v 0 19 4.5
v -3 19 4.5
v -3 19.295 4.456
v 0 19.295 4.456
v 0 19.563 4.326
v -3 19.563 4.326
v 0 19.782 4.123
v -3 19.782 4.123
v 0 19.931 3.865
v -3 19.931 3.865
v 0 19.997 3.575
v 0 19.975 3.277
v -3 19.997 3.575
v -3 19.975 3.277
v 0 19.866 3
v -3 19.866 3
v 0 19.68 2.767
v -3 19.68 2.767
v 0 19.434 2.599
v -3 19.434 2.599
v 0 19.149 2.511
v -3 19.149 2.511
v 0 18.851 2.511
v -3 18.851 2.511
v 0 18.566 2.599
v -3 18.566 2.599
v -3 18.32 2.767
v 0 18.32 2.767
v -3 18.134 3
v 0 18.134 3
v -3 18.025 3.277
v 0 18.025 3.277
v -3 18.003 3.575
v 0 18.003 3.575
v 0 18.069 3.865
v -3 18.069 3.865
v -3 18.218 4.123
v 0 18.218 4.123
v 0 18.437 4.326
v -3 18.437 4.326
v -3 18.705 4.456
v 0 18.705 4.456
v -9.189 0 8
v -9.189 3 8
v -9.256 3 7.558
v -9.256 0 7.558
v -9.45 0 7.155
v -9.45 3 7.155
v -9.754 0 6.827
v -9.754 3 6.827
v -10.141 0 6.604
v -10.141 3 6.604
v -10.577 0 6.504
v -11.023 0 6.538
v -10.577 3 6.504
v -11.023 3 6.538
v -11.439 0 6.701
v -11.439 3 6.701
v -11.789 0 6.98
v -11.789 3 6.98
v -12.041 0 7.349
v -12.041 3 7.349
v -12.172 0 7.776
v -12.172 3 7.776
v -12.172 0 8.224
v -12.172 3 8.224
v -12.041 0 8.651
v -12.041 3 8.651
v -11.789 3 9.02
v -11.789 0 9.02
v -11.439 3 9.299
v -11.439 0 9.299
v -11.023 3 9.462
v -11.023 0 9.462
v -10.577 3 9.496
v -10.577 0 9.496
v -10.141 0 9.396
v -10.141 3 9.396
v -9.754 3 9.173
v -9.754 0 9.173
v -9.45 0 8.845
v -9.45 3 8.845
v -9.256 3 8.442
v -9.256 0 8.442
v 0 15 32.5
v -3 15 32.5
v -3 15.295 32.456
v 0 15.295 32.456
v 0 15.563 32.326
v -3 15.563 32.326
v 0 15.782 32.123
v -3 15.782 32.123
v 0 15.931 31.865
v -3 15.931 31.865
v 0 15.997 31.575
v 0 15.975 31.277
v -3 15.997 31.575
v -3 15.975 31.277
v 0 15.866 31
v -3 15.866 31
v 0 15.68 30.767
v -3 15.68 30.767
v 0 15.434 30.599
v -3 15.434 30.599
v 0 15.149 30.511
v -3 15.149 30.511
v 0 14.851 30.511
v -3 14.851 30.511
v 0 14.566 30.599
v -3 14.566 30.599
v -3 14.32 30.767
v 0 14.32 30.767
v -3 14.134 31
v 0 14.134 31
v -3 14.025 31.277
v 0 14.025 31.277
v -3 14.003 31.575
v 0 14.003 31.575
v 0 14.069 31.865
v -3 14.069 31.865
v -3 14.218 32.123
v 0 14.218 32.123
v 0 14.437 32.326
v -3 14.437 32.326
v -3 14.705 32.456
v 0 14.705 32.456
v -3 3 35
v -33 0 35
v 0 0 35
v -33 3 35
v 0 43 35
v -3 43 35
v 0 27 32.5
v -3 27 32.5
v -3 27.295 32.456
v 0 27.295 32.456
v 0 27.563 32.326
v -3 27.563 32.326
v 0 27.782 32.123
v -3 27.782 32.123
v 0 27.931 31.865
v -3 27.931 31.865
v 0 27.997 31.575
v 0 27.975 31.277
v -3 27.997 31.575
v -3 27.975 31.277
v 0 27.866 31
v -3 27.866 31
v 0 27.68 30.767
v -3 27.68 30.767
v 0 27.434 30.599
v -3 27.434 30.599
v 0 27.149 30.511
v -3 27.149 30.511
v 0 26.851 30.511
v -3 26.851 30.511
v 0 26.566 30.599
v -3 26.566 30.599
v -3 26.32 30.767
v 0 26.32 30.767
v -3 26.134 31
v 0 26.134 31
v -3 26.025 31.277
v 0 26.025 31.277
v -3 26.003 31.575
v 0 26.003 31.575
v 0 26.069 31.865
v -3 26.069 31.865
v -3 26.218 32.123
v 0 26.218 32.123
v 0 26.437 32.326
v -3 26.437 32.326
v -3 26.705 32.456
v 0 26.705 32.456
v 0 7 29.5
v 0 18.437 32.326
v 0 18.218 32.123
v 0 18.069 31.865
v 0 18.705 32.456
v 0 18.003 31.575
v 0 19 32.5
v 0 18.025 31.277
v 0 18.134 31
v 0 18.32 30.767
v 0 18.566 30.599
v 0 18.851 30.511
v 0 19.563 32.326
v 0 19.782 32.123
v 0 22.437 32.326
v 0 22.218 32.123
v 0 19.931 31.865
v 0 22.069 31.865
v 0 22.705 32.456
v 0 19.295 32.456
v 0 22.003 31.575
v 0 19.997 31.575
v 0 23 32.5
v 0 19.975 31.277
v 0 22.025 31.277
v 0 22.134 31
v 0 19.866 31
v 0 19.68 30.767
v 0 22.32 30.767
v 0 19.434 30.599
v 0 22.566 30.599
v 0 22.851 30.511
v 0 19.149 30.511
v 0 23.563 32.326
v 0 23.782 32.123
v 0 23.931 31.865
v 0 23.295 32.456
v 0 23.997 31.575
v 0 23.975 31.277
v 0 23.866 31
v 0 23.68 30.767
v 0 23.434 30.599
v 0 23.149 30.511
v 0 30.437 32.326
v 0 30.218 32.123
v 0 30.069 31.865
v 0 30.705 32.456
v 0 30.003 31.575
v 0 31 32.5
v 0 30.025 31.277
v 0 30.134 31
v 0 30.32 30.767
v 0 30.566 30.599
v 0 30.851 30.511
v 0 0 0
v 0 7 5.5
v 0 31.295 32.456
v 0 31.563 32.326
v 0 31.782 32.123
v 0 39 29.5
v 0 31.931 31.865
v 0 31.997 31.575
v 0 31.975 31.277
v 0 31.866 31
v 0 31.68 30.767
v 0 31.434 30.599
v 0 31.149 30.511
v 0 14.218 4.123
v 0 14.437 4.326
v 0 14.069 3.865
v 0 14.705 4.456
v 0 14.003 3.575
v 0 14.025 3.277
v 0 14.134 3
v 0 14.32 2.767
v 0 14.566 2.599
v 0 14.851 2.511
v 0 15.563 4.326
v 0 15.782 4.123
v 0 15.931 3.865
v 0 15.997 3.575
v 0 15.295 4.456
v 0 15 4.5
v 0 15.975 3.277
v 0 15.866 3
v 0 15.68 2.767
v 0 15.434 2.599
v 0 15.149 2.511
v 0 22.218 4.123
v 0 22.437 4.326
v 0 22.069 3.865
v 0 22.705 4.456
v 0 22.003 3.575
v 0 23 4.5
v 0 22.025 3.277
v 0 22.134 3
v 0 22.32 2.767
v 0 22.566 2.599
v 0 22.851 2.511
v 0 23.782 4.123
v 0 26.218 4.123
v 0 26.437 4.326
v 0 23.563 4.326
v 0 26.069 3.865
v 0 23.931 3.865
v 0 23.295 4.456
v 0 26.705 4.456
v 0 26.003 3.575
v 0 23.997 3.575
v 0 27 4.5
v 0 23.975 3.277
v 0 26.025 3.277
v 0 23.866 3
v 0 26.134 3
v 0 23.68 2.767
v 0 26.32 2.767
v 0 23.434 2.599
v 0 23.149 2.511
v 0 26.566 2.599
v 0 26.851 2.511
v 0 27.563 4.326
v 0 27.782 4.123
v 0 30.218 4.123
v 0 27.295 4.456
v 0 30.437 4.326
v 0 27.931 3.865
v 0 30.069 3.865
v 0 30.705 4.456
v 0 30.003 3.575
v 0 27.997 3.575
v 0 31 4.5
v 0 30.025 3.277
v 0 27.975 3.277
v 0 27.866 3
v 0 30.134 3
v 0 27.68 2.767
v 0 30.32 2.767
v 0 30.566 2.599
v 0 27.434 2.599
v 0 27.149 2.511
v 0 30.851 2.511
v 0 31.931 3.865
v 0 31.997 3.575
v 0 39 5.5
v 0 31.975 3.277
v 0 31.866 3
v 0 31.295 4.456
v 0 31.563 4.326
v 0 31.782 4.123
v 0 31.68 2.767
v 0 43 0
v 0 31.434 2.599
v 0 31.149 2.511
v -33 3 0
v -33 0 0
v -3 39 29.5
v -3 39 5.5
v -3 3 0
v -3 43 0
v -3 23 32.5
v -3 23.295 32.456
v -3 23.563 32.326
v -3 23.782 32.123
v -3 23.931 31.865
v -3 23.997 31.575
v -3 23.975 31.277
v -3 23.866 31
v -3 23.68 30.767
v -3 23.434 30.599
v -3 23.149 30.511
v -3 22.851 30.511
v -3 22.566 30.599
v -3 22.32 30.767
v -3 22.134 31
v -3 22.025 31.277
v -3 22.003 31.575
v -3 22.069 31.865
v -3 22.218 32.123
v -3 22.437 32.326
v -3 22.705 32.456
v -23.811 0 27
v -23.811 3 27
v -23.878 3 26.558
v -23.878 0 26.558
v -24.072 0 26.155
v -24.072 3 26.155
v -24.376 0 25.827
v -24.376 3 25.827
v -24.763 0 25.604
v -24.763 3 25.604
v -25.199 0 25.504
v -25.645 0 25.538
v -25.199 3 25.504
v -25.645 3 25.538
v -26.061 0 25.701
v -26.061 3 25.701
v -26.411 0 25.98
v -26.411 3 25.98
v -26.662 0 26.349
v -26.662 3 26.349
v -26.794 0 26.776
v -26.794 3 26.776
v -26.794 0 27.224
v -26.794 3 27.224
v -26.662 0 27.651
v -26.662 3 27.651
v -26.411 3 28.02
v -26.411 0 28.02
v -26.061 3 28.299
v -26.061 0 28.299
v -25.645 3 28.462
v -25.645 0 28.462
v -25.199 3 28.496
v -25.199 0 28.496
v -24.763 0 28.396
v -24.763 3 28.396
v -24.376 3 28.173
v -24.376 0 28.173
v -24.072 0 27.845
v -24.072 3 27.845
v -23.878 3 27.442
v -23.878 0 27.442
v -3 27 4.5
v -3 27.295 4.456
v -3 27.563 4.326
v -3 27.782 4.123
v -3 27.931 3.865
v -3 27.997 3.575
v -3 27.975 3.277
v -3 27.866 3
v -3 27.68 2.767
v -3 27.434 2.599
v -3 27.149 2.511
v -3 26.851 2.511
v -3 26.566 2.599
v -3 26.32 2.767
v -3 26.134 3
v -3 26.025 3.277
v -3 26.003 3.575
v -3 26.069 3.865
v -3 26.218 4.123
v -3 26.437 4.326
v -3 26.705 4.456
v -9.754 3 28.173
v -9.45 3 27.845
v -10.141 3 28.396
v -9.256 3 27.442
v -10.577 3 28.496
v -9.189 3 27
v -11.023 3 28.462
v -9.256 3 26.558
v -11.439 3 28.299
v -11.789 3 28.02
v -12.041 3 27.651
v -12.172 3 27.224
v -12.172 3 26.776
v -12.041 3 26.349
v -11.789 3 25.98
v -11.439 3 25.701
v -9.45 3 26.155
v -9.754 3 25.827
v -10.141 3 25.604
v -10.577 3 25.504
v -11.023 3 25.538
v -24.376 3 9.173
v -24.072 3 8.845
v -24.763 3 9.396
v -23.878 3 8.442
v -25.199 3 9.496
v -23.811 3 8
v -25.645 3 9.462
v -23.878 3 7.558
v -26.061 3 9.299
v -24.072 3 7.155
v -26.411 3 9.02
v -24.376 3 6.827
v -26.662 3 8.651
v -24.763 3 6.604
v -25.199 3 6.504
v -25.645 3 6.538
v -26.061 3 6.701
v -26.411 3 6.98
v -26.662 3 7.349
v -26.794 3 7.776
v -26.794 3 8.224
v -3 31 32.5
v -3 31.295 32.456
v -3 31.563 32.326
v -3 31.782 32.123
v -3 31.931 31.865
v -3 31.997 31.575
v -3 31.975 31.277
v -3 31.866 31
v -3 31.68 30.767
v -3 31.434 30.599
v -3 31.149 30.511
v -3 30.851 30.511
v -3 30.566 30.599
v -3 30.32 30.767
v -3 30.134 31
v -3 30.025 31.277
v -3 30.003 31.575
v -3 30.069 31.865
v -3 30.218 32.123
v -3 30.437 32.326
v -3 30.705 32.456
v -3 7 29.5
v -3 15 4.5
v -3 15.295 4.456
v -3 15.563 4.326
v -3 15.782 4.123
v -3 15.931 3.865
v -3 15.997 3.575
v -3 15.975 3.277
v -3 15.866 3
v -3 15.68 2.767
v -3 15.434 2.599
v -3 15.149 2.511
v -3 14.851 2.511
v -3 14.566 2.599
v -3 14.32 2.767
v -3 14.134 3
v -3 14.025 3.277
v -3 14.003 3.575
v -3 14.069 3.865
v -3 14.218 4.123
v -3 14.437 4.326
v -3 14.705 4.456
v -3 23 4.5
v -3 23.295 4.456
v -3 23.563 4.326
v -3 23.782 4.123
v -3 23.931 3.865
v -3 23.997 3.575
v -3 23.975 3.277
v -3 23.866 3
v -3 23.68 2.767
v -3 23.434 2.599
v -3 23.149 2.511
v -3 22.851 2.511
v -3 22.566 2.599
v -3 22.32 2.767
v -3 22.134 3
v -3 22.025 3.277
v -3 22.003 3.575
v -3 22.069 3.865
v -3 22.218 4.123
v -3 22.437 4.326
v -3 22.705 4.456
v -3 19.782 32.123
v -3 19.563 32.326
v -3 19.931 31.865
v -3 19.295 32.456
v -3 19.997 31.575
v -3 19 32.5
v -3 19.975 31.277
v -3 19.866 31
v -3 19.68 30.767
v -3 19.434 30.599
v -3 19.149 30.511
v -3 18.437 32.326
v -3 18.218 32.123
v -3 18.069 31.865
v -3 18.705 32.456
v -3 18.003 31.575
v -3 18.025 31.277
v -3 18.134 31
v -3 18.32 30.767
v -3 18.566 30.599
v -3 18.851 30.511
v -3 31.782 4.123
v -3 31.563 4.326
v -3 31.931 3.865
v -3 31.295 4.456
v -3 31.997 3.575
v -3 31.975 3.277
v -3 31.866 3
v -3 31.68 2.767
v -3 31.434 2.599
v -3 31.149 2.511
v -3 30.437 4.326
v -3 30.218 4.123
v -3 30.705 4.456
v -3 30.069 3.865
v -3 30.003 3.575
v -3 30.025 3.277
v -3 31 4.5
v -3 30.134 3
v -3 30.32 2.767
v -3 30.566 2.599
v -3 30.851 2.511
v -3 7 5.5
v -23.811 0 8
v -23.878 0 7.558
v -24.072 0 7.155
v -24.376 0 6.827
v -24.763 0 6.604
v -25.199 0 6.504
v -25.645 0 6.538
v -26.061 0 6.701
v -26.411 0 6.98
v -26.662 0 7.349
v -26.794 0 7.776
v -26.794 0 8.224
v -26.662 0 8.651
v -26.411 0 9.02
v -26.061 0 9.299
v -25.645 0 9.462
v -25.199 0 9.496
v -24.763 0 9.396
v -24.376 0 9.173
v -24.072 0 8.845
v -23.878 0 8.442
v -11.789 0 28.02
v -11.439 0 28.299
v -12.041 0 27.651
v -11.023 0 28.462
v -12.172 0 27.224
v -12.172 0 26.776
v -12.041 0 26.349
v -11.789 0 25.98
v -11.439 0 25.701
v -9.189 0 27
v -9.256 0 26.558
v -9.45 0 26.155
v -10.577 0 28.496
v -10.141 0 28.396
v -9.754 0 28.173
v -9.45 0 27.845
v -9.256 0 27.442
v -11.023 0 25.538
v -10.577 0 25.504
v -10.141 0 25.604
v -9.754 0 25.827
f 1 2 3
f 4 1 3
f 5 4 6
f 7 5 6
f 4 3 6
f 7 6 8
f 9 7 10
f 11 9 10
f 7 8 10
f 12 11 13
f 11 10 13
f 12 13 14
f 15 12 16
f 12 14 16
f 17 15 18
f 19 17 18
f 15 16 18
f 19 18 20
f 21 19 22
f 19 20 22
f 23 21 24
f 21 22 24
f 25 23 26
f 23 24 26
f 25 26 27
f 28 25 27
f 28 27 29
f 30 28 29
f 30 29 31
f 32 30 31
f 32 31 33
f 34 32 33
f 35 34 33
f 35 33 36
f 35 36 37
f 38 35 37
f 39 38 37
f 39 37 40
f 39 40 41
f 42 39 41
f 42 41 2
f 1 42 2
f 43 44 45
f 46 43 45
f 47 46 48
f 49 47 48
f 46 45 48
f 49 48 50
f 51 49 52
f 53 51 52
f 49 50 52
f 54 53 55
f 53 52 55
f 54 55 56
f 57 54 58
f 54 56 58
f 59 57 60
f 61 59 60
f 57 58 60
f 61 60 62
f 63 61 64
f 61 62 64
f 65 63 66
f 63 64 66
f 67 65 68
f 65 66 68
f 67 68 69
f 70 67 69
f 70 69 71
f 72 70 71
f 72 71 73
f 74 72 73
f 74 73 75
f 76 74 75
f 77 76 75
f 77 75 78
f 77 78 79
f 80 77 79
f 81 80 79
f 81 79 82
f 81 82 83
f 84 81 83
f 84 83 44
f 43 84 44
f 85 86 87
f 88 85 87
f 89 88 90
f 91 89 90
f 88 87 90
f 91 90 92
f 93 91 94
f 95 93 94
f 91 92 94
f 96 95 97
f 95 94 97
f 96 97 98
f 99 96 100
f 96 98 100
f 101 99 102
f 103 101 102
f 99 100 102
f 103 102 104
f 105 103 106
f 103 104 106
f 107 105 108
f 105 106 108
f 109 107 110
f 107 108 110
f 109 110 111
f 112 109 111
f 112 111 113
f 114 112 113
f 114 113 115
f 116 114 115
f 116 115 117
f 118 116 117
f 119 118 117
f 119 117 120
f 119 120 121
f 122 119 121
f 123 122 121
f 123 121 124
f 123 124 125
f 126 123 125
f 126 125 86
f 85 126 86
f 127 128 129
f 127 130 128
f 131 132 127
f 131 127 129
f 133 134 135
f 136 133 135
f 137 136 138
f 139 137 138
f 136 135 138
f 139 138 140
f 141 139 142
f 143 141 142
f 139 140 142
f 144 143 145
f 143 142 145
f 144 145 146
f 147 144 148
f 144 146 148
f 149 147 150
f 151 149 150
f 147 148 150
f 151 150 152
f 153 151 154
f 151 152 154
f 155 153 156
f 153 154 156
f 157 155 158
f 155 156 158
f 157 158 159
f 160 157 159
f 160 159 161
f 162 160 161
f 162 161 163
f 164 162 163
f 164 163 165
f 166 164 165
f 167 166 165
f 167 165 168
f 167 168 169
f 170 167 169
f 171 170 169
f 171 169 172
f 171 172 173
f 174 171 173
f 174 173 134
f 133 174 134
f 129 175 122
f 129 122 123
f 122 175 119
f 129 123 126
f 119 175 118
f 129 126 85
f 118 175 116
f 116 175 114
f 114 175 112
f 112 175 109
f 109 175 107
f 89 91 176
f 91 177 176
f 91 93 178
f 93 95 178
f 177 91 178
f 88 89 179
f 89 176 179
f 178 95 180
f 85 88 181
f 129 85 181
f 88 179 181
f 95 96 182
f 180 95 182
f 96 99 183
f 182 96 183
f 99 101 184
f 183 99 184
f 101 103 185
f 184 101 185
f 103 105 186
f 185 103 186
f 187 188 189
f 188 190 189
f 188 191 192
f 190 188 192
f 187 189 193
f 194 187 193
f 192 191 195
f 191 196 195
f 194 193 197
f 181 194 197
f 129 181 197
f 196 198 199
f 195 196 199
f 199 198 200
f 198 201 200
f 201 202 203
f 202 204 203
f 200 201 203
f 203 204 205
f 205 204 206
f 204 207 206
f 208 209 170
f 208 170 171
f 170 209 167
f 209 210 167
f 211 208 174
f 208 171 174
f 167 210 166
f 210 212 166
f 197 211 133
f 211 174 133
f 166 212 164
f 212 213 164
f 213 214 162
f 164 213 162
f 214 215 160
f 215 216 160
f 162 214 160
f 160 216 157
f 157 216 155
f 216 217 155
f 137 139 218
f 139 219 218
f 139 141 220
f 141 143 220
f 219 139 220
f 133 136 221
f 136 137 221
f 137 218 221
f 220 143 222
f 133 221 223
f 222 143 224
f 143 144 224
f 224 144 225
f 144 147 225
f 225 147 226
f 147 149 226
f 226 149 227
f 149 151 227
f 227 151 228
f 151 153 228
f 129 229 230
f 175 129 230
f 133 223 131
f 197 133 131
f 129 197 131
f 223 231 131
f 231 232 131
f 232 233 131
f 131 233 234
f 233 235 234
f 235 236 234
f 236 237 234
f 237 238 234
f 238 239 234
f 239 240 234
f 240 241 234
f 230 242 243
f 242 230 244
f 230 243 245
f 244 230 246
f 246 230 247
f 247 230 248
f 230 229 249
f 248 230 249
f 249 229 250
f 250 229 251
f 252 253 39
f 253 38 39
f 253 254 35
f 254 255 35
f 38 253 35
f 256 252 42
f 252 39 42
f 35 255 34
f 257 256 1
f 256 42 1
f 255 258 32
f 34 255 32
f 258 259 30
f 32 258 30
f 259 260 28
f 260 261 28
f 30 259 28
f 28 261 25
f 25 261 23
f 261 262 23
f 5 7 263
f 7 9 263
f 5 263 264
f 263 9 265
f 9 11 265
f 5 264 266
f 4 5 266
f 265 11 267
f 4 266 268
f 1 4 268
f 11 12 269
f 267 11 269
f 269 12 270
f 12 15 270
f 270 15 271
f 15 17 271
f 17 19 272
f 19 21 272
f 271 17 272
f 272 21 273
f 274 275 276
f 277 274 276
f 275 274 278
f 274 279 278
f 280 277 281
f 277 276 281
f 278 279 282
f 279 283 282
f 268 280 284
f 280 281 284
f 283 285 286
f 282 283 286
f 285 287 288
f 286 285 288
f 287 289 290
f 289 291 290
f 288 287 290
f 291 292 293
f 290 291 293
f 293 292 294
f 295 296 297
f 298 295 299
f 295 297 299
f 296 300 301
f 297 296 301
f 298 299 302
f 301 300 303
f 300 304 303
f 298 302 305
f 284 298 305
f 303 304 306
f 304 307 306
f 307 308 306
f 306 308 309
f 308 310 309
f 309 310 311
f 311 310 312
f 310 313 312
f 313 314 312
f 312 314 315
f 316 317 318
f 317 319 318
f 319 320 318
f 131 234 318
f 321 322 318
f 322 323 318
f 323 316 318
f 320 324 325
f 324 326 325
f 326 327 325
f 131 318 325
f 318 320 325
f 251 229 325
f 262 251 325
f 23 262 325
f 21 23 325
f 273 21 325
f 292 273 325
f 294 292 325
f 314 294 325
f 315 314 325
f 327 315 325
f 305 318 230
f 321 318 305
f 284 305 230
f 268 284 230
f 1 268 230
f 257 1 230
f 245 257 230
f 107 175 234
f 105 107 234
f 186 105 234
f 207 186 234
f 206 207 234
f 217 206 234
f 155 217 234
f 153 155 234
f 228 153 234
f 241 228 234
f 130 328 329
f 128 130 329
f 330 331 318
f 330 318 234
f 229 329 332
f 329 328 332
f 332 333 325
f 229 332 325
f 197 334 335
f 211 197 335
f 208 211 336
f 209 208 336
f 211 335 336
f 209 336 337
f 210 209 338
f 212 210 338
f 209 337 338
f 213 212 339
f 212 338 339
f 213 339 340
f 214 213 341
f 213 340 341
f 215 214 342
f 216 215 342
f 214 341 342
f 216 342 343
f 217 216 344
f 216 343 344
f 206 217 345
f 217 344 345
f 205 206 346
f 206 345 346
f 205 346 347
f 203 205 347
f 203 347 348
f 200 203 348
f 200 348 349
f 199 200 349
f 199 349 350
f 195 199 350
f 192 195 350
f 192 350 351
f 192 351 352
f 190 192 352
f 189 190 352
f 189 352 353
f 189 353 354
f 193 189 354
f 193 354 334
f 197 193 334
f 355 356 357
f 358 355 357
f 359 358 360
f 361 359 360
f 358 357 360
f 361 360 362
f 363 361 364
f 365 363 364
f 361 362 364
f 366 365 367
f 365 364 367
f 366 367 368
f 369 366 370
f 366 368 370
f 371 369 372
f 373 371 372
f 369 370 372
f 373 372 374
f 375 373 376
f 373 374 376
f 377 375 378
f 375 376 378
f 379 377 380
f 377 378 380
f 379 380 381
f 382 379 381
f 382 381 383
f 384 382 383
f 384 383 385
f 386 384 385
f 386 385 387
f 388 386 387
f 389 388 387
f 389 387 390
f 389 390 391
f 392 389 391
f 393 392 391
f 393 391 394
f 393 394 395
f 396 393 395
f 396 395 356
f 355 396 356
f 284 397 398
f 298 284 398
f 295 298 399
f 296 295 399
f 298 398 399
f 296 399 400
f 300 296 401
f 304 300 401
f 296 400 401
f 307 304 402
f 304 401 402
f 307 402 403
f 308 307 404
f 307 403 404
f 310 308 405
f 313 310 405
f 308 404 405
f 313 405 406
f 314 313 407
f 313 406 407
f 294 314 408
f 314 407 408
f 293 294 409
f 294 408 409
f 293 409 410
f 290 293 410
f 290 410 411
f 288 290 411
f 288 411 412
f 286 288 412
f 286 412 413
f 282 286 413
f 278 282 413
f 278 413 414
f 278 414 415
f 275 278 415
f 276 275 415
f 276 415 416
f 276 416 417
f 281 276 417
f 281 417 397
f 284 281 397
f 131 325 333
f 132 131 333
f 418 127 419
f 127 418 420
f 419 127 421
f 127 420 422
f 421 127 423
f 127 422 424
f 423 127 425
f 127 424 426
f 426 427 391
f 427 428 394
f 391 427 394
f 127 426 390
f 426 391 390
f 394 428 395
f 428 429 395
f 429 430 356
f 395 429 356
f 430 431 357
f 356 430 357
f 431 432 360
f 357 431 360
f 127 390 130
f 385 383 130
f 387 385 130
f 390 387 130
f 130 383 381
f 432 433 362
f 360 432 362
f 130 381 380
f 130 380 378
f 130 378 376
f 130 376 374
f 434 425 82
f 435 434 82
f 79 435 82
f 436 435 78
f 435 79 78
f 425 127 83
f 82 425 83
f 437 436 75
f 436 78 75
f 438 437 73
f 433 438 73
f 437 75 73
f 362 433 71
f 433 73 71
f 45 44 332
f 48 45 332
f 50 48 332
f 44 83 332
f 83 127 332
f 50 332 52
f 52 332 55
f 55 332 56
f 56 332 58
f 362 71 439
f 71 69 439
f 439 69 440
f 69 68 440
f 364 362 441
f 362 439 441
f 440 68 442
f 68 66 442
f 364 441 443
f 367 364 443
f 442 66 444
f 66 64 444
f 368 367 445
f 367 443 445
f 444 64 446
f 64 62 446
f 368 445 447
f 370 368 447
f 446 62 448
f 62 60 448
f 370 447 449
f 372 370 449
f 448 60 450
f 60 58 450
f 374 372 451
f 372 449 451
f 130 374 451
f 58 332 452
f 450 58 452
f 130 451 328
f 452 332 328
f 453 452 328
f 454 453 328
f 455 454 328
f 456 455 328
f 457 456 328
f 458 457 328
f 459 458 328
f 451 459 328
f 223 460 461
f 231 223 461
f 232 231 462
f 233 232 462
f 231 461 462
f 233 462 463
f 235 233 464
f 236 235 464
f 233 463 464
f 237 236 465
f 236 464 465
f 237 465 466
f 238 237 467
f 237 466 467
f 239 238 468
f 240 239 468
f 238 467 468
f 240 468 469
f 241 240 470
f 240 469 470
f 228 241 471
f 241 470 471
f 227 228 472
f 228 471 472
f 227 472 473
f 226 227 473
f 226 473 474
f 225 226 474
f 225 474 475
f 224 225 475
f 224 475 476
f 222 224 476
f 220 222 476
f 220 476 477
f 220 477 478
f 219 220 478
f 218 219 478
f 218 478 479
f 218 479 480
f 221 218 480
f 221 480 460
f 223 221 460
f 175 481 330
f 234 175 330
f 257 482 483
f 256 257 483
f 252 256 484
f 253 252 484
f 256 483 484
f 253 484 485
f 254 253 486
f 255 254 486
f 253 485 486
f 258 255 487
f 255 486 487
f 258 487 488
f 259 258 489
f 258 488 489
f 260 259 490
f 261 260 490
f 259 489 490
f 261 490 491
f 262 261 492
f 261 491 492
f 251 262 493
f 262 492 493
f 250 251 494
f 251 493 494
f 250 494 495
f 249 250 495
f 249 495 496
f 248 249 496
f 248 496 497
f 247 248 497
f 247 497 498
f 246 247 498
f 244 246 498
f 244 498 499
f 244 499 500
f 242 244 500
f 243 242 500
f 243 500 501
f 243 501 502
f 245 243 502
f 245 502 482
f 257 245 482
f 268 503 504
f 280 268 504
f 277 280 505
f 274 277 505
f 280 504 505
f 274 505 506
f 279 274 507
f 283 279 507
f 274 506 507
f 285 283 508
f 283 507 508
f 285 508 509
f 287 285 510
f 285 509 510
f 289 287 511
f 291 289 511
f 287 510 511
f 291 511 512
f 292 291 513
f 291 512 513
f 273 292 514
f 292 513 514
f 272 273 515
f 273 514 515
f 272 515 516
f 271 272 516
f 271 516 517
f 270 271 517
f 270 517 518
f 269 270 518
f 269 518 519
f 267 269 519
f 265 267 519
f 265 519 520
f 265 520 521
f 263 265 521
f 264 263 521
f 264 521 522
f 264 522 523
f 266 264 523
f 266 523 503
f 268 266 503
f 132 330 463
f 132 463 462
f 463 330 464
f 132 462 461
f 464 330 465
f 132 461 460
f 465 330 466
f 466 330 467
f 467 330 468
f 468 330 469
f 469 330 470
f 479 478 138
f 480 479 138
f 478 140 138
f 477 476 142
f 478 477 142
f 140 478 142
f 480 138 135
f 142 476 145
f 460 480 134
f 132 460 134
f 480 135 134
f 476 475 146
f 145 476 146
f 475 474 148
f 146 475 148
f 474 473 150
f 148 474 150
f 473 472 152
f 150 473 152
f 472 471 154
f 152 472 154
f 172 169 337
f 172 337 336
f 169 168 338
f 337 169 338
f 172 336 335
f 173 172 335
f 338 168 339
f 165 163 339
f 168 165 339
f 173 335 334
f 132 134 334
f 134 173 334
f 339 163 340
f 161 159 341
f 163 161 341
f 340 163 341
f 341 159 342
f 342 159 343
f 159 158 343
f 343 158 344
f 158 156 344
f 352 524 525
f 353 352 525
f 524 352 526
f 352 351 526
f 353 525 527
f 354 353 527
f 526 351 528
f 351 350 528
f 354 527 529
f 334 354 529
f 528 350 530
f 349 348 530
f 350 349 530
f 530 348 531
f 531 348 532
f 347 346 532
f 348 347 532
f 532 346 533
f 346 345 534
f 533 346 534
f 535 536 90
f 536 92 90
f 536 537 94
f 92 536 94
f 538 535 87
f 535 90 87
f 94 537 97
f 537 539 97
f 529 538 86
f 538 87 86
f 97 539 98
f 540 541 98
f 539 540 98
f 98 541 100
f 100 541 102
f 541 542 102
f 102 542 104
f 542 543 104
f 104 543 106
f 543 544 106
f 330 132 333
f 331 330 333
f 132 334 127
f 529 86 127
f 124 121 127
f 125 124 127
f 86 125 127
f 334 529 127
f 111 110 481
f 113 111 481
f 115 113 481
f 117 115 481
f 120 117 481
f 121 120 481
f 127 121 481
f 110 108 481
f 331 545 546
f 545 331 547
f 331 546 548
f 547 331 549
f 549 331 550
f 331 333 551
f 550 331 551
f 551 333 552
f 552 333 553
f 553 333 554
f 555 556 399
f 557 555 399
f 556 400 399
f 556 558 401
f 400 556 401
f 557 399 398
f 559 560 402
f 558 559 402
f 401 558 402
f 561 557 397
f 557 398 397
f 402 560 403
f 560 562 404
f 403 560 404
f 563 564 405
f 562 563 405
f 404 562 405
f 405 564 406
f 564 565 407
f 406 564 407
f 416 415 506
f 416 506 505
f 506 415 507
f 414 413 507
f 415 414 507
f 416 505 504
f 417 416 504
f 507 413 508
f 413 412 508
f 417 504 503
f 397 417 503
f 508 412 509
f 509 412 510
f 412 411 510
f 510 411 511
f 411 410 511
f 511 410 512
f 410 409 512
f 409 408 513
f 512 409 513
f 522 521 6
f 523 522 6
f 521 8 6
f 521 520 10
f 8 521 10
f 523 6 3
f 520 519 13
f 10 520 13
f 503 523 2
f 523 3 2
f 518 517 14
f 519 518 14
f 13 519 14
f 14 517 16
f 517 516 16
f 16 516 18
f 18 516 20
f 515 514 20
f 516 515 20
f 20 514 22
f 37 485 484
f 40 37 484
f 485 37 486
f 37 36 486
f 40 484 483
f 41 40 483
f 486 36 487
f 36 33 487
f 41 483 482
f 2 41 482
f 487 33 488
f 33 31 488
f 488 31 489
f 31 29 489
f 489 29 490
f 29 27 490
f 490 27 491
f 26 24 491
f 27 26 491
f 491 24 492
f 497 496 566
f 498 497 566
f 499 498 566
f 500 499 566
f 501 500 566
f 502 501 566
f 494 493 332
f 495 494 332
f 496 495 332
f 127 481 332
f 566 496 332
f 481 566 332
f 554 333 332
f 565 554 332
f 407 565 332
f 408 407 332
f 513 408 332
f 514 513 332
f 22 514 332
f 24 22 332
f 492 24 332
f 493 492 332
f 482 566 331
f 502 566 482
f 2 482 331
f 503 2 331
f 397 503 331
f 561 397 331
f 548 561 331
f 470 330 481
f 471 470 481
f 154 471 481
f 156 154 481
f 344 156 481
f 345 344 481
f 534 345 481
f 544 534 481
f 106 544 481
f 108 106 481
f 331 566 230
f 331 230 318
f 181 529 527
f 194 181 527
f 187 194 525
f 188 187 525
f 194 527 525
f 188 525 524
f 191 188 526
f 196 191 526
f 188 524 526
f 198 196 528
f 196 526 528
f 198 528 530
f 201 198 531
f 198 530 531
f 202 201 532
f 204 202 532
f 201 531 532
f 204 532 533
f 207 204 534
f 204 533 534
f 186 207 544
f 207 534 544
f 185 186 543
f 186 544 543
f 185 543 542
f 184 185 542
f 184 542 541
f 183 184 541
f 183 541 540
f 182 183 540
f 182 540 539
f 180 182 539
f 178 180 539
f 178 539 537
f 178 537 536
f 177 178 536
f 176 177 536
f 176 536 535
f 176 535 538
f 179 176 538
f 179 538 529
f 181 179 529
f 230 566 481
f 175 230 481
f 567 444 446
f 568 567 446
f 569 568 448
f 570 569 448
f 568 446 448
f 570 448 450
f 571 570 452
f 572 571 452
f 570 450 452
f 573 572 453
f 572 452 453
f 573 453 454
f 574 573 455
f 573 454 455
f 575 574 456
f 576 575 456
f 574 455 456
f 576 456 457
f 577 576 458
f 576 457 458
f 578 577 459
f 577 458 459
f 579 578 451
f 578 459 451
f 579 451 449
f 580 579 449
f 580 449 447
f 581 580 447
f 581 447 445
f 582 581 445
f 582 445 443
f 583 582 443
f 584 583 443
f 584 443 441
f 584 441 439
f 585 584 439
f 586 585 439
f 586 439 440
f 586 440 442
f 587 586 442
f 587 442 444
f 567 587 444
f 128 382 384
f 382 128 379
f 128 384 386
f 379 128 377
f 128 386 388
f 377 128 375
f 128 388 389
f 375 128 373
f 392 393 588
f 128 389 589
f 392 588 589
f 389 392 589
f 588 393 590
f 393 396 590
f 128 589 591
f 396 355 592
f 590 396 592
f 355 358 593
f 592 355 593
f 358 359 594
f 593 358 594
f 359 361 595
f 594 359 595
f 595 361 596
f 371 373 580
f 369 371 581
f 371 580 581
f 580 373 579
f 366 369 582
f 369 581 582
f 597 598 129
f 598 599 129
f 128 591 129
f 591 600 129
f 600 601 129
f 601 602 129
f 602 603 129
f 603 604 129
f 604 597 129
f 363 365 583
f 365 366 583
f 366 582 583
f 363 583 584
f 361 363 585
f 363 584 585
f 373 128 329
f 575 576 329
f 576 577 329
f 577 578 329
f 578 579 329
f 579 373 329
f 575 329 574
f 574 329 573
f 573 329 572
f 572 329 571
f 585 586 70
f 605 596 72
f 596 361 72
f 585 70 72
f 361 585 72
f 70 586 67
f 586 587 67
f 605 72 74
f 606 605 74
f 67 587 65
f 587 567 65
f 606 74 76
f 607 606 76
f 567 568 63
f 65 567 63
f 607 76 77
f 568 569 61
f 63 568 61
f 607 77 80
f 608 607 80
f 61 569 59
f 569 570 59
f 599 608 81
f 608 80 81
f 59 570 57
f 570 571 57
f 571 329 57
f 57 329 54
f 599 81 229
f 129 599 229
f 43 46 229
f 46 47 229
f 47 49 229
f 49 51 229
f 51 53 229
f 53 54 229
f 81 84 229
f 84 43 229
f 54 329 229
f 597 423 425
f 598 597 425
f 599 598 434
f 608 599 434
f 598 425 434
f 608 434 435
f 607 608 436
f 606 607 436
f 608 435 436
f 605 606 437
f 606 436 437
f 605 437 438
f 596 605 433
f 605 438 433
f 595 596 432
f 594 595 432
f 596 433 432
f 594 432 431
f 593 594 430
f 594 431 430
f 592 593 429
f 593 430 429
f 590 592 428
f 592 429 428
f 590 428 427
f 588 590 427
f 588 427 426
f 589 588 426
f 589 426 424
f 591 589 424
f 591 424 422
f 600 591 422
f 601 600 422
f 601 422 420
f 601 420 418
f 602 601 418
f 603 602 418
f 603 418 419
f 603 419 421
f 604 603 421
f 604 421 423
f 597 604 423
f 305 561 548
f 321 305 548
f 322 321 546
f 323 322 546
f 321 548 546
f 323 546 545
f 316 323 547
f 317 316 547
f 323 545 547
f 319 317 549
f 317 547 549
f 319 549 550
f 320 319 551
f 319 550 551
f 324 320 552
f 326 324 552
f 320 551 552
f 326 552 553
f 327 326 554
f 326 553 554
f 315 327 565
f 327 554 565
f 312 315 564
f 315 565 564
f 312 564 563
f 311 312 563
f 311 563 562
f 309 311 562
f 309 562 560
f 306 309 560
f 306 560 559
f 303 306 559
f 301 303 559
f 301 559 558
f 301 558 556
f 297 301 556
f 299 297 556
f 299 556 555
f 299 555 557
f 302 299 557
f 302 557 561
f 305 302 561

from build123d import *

# Parameters (mm, degrees)
EXTRUDE_1_DEPTH     = 35
SKETCH_2_W          = 24
SKETCH_2_H          = 32
SKETCH_2_R          = 1
CUT_EXTRUDE_1_DEPTH = 4
SKETCH_3_R          = 1.5
CUT_EXTRUDE_2_DEPTH = 4


with BuildPart() as part:
    # 草图1 → 凸台-拉伸1 (new body)
    with BuildSketch(Plane.XY):
        Polygon((-33, 0), (0, 0), (0, 43), (-3, 43), (-3, 3), (-33, 3), align=None)
    extrude(amount=EXTRUDE_1_DEPTH)

    # 草图2 → 切除-拉伸1 (cut, through all)
    with BuildSketch(Plane.ZY.offset(3)):
        with Locations((17.5, 23)):
            Rectangle(SKETCH_2_W, SKETCH_2_H)
        with Locations((3.5, 31)):
            Circle(SKETCH_2_R)
        with Locations((3.5, 27)):
            Circle(SKETCH_2_R)
        with Locations((3.5, 23)):
            Circle(SKETCH_2_R)
        with Locations((3.5, 19)):
            Circle(SKETCH_2_R)
        with Locations((3.5, 15)):
            Circle(SKETCH_2_R)
        with Locations((31.5, 15)):
            Circle(SKETCH_2_R)
        with Locations((31.5, 19)):
            Circle(SKETCH_2_R)
        with Locations((31.5, 23)):
            Circle(SKETCH_2_R)
        with Locations((31.5, 27)):
            Circle(SKETCH_2_R)
        with Locations((31.5, 31)):
            Circle(SKETCH_2_R)
    extrude(amount=-CUT_EXTRUDE_1_DEPTH, mode=Mode.SUBTRACT)

    # 草图3 → 切除-拉伸2 (cut, through all)
    with BuildSketch(Plane(origin=(0, 3, 0), x_dir=(1, 0, 0), z_dir=(0, 1, 0))):
        with Locations((-25.310950673, -8)):
            Circle(SKETCH_3_R)
        with Locations((-10.689049327, -8)):
            Circle(SKETCH_3_R)
        with Locations((-10.689049327, -27)):
            Circle(SKETCH_3_R)
        with Locations((-25.310950673, -27)):
            Circle(SKETCH_3_R)
    extrude(amount=-CUT_EXTRUDE_2_DEPTH, mode=Mode.SUBTRACT)


solid = part.part
